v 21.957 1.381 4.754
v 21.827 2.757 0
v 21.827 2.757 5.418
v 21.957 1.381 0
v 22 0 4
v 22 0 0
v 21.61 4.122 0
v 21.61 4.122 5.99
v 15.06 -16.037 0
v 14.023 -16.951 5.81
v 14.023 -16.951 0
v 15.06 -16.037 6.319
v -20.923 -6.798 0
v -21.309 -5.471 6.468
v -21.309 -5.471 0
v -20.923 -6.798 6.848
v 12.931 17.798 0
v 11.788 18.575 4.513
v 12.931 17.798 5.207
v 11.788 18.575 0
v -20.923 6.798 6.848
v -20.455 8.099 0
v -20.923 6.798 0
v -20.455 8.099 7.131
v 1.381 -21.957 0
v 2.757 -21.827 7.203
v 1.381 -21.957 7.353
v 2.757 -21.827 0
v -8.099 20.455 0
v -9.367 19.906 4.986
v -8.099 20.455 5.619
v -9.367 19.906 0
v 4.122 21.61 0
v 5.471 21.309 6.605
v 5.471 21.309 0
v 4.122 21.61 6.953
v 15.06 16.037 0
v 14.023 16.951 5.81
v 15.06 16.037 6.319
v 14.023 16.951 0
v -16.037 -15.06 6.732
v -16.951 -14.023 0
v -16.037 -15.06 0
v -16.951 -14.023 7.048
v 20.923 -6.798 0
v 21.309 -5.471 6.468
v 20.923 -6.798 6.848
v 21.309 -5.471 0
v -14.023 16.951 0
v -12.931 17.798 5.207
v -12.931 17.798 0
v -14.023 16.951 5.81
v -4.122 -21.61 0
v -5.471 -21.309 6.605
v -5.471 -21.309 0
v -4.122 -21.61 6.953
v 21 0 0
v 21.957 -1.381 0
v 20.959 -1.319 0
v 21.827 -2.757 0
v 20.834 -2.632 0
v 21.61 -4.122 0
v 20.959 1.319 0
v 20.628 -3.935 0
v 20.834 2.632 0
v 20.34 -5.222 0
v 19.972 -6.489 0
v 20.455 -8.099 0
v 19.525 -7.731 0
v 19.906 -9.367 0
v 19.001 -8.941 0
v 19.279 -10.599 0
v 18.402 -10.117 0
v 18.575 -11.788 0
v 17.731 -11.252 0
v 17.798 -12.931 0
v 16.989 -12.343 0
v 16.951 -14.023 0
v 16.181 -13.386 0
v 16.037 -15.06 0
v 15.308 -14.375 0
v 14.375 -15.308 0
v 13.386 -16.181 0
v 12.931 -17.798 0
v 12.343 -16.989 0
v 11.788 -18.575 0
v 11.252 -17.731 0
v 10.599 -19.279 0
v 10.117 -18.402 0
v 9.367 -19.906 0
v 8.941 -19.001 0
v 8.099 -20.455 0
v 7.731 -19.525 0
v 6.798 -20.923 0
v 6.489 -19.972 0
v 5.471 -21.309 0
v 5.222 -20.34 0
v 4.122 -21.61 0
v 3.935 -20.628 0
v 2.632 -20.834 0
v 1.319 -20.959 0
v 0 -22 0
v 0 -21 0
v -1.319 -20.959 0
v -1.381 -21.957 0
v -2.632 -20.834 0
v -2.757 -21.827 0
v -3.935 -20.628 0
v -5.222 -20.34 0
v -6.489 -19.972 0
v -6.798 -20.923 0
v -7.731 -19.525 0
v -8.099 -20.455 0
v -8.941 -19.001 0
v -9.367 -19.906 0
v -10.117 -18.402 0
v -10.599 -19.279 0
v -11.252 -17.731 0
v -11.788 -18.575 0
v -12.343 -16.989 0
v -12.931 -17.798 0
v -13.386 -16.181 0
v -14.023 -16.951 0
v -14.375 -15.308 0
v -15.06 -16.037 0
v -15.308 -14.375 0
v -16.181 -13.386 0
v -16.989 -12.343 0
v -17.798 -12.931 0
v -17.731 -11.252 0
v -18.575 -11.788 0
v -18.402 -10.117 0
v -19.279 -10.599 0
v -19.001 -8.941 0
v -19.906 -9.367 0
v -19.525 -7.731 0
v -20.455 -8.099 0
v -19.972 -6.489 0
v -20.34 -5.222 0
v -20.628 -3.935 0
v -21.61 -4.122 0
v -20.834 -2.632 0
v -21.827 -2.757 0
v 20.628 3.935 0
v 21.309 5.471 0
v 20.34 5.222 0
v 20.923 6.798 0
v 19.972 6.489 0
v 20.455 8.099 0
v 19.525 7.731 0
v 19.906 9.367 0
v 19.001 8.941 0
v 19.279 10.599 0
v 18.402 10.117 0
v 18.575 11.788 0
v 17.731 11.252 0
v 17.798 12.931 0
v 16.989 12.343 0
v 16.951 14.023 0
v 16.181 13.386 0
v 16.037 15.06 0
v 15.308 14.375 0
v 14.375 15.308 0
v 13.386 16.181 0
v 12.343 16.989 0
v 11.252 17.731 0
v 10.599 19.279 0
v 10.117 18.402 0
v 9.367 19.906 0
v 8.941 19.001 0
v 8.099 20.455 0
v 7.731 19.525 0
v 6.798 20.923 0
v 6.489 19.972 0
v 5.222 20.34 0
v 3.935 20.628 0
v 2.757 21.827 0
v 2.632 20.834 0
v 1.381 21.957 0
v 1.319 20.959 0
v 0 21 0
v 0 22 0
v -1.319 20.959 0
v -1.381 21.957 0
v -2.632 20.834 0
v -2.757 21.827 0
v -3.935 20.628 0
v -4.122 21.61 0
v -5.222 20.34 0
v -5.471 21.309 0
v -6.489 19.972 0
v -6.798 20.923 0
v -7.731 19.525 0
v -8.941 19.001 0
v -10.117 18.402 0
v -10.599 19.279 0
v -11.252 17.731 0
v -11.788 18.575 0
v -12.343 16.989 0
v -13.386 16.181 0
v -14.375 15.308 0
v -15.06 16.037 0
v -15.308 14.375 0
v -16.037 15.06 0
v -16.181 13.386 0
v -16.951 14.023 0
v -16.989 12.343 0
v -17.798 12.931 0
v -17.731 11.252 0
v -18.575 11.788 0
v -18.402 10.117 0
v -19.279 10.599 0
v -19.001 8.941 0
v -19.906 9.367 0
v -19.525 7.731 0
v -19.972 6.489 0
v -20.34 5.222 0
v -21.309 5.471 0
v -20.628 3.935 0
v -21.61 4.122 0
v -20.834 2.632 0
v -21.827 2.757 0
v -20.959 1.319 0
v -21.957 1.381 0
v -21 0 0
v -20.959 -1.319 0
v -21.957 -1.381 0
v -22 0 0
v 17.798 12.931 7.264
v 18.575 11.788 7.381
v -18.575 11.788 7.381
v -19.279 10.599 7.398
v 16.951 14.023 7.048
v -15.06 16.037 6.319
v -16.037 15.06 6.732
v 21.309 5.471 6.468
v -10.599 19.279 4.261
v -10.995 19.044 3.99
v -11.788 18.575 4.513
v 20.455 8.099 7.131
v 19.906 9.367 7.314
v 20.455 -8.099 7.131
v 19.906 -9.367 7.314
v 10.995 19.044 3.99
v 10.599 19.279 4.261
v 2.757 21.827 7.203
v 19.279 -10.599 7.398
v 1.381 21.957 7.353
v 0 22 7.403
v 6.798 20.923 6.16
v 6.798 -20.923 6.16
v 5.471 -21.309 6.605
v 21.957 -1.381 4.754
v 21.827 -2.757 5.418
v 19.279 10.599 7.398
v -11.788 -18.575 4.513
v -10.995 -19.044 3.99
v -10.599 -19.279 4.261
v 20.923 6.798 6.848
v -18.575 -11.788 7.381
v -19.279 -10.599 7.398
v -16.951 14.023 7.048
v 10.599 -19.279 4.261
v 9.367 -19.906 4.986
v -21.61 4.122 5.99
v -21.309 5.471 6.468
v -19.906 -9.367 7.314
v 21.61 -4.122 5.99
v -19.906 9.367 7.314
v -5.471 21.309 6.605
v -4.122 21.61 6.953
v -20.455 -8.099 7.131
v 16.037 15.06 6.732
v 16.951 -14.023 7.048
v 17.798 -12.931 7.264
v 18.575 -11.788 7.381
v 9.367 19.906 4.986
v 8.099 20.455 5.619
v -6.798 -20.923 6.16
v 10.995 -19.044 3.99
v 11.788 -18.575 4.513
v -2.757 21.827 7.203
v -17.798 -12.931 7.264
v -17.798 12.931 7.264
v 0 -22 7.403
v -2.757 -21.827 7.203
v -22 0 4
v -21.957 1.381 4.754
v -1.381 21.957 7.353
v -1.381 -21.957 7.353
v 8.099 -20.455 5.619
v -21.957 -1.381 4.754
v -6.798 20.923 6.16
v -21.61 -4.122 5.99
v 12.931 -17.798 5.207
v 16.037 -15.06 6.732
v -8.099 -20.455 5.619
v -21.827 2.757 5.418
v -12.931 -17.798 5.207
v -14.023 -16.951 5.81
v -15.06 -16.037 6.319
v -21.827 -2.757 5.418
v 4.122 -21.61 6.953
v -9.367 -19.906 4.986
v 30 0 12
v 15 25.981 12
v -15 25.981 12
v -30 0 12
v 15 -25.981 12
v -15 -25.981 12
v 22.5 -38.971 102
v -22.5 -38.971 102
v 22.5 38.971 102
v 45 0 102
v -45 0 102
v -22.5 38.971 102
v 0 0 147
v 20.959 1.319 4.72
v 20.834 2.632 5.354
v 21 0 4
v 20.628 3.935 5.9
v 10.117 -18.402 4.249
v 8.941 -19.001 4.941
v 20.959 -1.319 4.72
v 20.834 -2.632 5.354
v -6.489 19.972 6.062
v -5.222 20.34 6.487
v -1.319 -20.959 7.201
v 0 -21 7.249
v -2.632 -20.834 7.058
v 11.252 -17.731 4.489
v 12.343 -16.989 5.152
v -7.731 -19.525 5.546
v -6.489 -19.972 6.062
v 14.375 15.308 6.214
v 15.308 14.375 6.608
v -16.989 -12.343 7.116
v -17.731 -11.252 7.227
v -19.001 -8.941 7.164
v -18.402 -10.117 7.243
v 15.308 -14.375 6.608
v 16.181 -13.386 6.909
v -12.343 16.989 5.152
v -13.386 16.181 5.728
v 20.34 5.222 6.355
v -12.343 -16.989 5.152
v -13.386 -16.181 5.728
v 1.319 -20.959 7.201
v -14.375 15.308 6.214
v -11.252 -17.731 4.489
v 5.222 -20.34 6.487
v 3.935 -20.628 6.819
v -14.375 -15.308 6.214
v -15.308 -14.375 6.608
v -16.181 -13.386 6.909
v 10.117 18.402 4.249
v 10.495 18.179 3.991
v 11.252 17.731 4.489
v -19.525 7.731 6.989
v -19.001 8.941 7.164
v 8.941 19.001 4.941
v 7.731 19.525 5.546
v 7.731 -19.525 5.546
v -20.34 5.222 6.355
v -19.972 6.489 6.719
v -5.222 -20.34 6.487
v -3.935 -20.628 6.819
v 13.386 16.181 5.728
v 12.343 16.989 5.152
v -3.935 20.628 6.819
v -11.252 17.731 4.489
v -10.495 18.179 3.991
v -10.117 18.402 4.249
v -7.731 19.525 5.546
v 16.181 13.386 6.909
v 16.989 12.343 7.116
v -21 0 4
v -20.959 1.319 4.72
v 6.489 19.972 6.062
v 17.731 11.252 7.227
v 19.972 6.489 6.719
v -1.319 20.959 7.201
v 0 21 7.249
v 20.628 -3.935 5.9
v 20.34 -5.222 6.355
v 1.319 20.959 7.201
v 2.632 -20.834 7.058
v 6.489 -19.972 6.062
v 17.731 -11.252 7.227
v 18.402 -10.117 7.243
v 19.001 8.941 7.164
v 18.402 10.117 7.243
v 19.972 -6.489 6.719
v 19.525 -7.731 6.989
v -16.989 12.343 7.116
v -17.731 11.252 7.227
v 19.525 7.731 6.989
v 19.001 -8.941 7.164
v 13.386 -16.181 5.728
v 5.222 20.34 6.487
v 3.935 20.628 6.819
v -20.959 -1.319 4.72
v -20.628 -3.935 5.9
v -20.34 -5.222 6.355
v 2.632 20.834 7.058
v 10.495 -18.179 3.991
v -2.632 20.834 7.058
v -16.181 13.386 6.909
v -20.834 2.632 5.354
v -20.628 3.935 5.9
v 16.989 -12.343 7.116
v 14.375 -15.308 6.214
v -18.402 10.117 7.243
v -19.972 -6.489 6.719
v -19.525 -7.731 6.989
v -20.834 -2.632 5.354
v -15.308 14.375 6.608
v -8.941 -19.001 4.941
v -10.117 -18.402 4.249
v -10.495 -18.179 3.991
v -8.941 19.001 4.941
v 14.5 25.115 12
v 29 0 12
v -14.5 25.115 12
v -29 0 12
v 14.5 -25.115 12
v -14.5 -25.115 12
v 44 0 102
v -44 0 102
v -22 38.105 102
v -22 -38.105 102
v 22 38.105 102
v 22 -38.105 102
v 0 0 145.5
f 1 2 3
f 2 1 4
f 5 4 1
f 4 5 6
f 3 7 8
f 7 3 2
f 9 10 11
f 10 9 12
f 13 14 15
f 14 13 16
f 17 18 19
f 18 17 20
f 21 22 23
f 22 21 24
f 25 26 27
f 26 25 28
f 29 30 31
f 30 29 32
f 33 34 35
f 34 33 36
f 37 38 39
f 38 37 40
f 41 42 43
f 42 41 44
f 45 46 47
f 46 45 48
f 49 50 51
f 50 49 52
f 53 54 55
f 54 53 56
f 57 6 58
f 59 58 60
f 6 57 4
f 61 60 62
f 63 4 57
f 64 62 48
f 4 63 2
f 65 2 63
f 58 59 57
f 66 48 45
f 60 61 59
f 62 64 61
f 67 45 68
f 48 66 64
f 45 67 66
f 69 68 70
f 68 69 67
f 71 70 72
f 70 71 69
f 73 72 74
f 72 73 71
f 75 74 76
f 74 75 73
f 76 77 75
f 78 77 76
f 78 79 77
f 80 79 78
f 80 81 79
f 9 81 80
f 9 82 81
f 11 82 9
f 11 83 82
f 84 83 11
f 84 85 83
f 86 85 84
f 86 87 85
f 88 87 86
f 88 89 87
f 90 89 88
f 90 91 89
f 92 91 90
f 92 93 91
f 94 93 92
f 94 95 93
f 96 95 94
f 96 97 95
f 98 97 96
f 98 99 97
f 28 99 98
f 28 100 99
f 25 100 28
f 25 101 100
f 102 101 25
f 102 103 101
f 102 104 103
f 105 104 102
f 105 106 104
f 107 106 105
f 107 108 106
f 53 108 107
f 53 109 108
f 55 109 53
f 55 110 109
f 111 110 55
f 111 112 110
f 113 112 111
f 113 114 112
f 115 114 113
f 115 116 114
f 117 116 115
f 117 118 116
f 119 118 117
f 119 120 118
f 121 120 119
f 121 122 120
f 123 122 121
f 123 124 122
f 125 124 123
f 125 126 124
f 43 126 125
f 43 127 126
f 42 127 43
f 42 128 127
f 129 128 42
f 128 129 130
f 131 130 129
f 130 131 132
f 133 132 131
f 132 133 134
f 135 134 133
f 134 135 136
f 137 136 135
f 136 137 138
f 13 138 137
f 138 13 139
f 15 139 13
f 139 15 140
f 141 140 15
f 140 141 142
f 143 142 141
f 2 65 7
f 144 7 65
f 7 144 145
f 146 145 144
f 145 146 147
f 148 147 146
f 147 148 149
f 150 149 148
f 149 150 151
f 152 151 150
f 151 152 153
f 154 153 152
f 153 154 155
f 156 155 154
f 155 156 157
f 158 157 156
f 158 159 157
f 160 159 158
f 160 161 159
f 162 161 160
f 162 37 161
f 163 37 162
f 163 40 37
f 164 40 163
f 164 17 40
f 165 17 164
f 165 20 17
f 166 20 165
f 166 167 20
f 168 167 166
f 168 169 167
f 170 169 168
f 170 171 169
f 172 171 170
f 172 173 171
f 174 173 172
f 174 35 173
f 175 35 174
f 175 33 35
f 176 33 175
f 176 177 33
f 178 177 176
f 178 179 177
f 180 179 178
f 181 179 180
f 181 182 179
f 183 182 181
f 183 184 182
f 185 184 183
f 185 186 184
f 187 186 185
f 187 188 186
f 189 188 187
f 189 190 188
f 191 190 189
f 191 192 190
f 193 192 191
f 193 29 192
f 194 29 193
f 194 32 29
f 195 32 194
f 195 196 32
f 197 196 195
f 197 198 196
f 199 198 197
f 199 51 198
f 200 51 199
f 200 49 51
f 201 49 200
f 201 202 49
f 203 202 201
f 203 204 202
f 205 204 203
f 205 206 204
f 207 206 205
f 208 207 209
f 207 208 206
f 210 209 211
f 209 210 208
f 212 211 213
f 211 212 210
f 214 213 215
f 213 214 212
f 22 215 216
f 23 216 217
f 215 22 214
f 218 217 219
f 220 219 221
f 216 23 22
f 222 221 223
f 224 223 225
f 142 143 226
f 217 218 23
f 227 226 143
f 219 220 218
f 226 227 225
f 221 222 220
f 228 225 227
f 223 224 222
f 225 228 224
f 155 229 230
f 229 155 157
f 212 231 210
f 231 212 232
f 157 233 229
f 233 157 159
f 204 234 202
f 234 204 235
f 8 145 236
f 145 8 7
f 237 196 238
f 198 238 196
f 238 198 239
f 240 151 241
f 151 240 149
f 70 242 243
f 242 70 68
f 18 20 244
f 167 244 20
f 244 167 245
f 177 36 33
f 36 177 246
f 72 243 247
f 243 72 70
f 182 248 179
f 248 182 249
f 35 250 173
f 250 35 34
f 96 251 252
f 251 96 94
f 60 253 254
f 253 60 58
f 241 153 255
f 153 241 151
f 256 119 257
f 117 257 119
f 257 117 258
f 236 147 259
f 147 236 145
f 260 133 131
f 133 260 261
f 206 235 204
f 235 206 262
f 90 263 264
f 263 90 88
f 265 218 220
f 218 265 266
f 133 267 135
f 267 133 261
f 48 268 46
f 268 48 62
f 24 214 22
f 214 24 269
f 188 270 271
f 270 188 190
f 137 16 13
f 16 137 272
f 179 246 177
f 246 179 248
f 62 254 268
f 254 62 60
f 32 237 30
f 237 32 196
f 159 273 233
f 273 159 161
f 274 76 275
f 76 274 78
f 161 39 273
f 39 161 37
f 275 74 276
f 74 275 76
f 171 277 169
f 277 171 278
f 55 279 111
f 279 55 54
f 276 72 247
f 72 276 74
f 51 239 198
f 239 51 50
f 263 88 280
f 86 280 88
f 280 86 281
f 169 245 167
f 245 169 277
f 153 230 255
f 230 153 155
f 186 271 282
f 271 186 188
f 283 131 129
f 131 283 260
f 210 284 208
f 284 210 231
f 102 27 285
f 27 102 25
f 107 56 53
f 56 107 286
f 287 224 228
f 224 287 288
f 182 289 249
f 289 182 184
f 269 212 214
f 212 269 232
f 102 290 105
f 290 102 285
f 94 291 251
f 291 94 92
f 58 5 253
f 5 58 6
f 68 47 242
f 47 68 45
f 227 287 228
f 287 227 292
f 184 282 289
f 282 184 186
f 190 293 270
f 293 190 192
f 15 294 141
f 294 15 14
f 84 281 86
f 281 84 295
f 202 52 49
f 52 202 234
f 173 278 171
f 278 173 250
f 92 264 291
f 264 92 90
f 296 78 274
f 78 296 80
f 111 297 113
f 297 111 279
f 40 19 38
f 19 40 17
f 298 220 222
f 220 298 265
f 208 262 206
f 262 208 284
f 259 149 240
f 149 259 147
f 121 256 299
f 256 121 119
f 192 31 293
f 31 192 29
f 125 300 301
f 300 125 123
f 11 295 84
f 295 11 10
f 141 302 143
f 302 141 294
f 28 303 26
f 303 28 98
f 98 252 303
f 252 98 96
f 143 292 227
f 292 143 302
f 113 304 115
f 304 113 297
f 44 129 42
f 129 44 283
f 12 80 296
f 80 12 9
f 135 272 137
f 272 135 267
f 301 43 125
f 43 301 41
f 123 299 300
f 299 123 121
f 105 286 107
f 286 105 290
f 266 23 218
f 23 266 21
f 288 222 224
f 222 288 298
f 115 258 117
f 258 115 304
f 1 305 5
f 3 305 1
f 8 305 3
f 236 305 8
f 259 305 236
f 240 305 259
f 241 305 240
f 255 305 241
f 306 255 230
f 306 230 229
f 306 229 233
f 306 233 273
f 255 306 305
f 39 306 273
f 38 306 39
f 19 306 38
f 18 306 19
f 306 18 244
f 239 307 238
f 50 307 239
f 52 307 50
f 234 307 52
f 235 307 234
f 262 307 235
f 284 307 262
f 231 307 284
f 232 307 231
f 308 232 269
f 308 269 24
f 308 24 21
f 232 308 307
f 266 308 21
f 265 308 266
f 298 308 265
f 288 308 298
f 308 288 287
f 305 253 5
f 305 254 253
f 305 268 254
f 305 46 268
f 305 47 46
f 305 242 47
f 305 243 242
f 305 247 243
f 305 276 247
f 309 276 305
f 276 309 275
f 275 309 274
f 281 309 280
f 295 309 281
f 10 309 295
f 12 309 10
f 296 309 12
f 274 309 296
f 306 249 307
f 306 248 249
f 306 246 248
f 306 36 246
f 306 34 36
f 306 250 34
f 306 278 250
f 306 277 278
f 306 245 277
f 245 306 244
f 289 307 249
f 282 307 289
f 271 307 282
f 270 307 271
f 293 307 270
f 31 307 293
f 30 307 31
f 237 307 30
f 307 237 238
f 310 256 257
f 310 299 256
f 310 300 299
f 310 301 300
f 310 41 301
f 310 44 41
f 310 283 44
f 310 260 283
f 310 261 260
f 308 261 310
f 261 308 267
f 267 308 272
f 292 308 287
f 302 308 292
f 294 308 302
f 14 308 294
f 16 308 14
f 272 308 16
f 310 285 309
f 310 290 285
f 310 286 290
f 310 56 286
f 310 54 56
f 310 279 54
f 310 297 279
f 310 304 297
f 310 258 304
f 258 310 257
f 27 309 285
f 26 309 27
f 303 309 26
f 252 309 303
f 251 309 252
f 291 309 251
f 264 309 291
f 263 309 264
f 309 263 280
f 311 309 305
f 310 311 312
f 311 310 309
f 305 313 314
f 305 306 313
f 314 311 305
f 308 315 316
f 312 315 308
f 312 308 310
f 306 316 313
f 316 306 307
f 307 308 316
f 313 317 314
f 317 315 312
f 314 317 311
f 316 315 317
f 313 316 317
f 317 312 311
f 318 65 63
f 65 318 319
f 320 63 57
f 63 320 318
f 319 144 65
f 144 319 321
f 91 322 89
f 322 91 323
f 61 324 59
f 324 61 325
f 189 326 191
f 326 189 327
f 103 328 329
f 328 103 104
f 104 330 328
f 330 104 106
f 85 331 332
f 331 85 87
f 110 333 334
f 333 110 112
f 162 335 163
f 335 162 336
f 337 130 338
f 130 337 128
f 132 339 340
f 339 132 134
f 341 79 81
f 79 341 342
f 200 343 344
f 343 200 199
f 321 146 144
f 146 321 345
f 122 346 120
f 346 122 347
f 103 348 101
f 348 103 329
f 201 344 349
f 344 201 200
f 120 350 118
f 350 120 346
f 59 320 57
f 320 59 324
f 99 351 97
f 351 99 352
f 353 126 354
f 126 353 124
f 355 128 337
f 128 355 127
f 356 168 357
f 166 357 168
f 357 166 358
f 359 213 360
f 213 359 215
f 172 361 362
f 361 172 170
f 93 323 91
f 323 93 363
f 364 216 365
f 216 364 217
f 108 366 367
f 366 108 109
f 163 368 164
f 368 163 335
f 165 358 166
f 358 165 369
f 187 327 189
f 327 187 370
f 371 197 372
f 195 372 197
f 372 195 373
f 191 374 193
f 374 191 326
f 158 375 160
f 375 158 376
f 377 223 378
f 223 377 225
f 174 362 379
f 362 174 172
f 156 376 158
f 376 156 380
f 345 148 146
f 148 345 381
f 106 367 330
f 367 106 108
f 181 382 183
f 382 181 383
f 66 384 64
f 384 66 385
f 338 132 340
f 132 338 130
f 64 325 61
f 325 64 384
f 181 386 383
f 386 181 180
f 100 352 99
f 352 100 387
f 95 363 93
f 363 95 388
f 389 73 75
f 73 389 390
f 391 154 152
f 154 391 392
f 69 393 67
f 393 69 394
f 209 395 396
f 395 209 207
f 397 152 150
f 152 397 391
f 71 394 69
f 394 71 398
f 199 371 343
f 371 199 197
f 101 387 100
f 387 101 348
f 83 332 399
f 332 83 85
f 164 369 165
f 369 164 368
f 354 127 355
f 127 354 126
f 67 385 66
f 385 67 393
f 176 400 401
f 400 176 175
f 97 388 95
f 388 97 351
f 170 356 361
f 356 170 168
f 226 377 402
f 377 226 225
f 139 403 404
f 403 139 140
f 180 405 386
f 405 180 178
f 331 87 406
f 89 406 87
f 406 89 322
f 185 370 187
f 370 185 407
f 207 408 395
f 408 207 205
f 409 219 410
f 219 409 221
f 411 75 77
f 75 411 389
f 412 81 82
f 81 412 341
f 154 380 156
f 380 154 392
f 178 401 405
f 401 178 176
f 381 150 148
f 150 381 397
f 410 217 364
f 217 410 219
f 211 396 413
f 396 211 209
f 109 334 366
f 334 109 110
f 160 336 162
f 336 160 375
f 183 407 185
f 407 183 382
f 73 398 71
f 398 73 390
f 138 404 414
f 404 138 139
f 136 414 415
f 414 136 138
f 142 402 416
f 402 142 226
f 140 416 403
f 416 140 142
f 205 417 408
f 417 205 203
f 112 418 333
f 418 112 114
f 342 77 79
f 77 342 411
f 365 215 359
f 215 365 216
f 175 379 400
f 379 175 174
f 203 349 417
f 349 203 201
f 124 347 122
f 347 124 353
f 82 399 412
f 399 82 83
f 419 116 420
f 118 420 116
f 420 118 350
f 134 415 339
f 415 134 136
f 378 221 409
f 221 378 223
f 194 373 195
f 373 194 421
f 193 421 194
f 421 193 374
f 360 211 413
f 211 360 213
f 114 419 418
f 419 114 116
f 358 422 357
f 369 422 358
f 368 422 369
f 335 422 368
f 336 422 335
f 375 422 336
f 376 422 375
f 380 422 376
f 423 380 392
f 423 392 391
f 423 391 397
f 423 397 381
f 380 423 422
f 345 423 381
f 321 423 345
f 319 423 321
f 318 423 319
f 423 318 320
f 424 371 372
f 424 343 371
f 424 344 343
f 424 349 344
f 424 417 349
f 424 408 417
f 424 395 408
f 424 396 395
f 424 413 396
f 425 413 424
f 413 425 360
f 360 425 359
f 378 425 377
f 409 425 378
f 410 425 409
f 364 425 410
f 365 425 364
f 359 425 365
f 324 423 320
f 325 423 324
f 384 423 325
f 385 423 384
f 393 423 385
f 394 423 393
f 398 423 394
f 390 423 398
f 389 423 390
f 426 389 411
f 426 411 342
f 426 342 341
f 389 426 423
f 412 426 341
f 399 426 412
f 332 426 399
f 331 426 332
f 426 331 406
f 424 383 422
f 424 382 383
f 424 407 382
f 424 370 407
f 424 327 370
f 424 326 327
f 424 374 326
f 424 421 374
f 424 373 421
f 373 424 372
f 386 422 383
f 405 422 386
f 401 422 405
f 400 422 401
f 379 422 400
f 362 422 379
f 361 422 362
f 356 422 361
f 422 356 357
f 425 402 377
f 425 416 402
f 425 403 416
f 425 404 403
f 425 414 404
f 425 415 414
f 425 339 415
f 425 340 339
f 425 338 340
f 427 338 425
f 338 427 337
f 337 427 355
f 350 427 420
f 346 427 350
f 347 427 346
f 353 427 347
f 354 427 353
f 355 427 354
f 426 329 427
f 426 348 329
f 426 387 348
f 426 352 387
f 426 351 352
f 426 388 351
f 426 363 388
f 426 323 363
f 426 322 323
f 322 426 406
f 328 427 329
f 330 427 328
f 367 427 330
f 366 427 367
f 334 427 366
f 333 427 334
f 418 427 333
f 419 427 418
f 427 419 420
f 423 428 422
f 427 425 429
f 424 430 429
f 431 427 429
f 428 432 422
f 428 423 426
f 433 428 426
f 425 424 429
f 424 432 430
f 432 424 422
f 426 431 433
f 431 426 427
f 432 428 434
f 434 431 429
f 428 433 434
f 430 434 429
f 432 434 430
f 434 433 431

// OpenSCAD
//Lamp cap globe-style quartz crystal.
//You can adjust the five variables below
base=44;      //Diameter of base for lamp
rim=4;            //Length of rim at base
size=60;        //Diameter of crystal
facets=6;      //Number of sides (default 6)
scaling=1.5;  //Scale of crystal length (default 1.5)
//Don't change variables below here
half=size/2;
upper=half-(base/2)+rim;
$fn=facets;
difference(){
union(){
//outer body
translate([0,0,0])
cylinder(h=4+rim,d1=base,d2=base,$fn=100);
translate([0,0,-(base/2)+rim])
cylinder(h=half,d1=0,d2=size);
translate([0,0,upper])
cylinder(h=size*scaling,d1=size,d2=half*3);
translate([0,0,upper+size*scaling])
cylinder(h=(half*3)/2,d1=half*3,d2=0);
}
//Inner core.
translate([0,0,-1])
cylinder(h=6+rim,d1=base-2,d2=base-2,$fn=100);
translate([0,0,-(base/2)+rim+1])
cylinder(h=half-1,d1=0,d2=size-2);
translate([0,0,upper])
cylinder(h=size*scaling,d1=size-2,d2=(half*3)-2);
translate([0,0,upper+size*scaling])
cylinder(h=(half*3)/2-1.5,d1=(half*3)-2,d2=0);
translate([-half,-half,-half])
cube([size,size,half]);
//x-ray box
//translate([-80,-80,-50])
//cube([160,80,280]);
}
